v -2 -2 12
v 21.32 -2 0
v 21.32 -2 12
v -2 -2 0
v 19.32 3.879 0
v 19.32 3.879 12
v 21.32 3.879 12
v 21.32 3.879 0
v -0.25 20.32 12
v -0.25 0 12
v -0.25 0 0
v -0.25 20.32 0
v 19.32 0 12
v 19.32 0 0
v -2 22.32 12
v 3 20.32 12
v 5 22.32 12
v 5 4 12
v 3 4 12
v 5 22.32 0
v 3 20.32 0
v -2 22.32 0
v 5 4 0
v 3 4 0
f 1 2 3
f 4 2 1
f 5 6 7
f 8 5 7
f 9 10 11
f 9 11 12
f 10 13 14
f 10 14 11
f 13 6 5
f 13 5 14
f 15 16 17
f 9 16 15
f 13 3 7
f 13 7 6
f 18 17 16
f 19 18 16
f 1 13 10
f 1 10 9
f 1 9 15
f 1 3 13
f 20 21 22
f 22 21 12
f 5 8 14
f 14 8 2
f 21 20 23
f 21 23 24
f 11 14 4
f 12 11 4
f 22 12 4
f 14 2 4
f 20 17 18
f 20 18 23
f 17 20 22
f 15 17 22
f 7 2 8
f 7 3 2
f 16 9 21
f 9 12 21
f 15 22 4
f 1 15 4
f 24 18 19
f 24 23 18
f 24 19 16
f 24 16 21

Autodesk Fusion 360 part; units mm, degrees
sketch "Sketch1" plane through (0, 0, 0) normal (0, 0, 1) x (1, 0, 0)
  line L0 (0, 0) -> (0, 20.32)
  line L1 (3, 20.32) -> (3, 1.5)
  line L2 (20.32, 3) -> (3, 3)
  line L3 (3, 3) -> (3, 1.5)
  line L4 (8.5, 2) -> (8.3025, 2)
  line L5 (20.32, 3) -> (20.32, 0)
  line L6 (0, 20.32) -> (3, 20.32)
  line L7 (22.32, 0) -> (22.32, 1)
  line L8 (19.558, -2) -> (0, -2)
  line L9 (-2, 19.558) -> (-2, -2)
  line L10 (-2, -2) -> (0, -2)
  line L11 (22.32, 0) -> (22.32, -2)
  line L12 (22.32, -2) -> (19.558, -2)
  line L13 (0, 22.32) -> (-2, 22.32)
  line L14 (-2, 22.32) -> (-2, 19.558)
  line L15 (0, 22.32) -> (1, 22.32)
  line L16 (5, 19.558) -> (5, 5)
  line L17 (5, 5) -> (19.558, 5)
  line L18 (1, 22.32) -> (5, 22.32)
  line L19 (5, 22.32) -> (5, 19.558)
  line L20 (19.558, 5) -> (10.5472, 5)
  line L21 (22.32, 1) -> (22.32, 5)
  line L22 (5, 5) -> (22.32, 5)
  line L23 (0, 0) -> (20.32, 0)
  dimension "d30" = 20.32
  dimension "d31" = 20.32
  dimension "d33" = 2
  dimension "d34" = 2
  dimension "d35" = 3
  dimension "d36" = 2
  dimension "d37" = 2
  dimension "d38" = 3
sketch "Sketch2" plane through (0, 0, 0) normal (0, 0, 1) x (-1, 0, 0)
  line L0 (-8.5, 0) -> (0, 0)
  line L1 (0, 0) -> (0, -8.35)
  line L2 (0, -8.35) -> (-1, -8.35)
  line L3 (-1, -8.35) -> (-1, -1)
  line L4 (-1, -1) -> (-8.5, -1)
  line L5 (-9.5, -2) -> (-2, -2)
  line L6 (-2, -9.35) -> (1, -9.35)
  line L7 (1, -9.35) -> (1, -8.35)
  line L8 (-9.5, 0.9516) -> (-9.5, -2)
  line L9 (-3.5, -1) -> (-1, -1)
  line L10 (-1, -1) -> (-1, -4)
  line L11 (-1, -4) -> (-3.5, -4)
  line L12 (-3.5, -4) -> (-3.5, -1)
  line L13 (-3.5, -1) -> (-1, -1)
  line L14 (-1, -4) -> (-1, -1)
  line L15 (-3.5, -1) -> (-1, -1)
  line L16 (1, -8.35) -> (1, 0.9516)
  line L17 (1, 0.9516) -> (-9.5, 0.9516)
  line L18 (-1, -4) -> (-1, -8)
  line L19 (-3.5, -1) -> (-7.5, -1)
  line L20 (-1, -8) -> (-7.5024, -8)
  line L21 (-7.5024, -8) -> (-7.5, -1)
  dimension "d29" = 4
extrude "Extrude3" add sketch "Sketch1" along normal blind 8
extrude "Extrude4" cut sketch "Sketch2" along normal blind 10
sketch "Sketch3" plane through (0, 0, 8) normal (0, 0, 1) x (-1, 0, 0)
  line L0 (-3, -8) -> (-5, -8)
  line L1 (-5, -8) -> (-5, -22.32)
  line L2 (-5, -22.32) -> (2, -22.32)
  line L3 (2, -22.32) -> (2, 2)
  line L4 (2, 2) -> (-22.32, 2)
  line L5 (-22.32, 2) -> (-22.32, -5)
  line L6 (-22.32, -5) -> (-7.5014, -5)
  line L7 (-7.5014, -5) -> (-7.5007, -3)
  line L8 (-7.5007, -3) -> (-20.32, -3)
  line L9 (-20.32, -3) -> (-20.32, 0)
  line L10 (-20.32, 0) -> (0, 0)
  line L11 (0, 0) -> (0, -20.32)
  line L12 (0, -20.32) -> (-3, -20.32)
  line L13 (-3, -20.32) -> (-3, -8)
  line L14 (-5, 0) -> (-5, 0)
  line L15 (-5, 0) -> (-5, -5.022)
  line L16 (-5, -5.022) -> (-5, -5.022)
  line L17 (-5, -5.022) -> (-5, 0)
  line L18 (-22.32, 2) -> (-5, 2)
  line L19 (-5, 2) -> (-5, 2)
  line L20 (-5, 2) -> (-22.32, 2)
  line L21 (-22.32, 2) -> (-22.32, 2)
  line L22 (-5, -5.022) -> (-22.32, -5.022)
  line L23 (-22.32, -5.022) -> (-22.32, -5)
  line L24 (-22.32, -5) -> (-5, -5)
  line L25 (-5, -5) -> (-5, -5.022)
  line L26 (-5, 2) -> (-5, 0)
  line L27 (-22.32, -1.8791) -> (-5, -1.8791)
extrude "Extrude5" cut sketch "Sketch3" against normal blind 8 contours L7 L8 L9 L15 L17 L24 L27 | L5 L6 L7 L8 L9 L24 L27
extrude "Extrude6" add 1 faces at (-1.3333, 13.5467, 8) along direction (0, 0, 1) blind 4
sketch "Sketch4" plane through (0, 0, 12) normal (0, 0, 1) x (-1, 0, 0)
  line L0 (-20.32, 0) -> (0, 0)
  line L1 (-3, -20.32) -> (-3, -8)
  line L2 (-3, -8) -> (-5, -8)
  line L3 (-5, -8) -> (-5, -22.32)
  line L4 (-5, -22.32) -> (2, -22.32)
  line L5 (2, -22.32) -> (2, 2)
  line L6 (2, 2) -> (-22.32, 2)
  line L7 (0, 0) -> (0.25, 0)
  line L8 (0, -20.32) -> (0, 0)
  line L9 (0.25, 0) -> (0.25, -20.5)
  line L10 (0, -20.32) -> (0.25, -20.32)
  line L11 (-22.32, -1.8791) -> (-20.32, -1.8791)
  line L12 (-20.32, -1.8791) -> (-20.32, 0)
  line L13 (-22.32, 2) -> (-22.32, -1.8791)
  dimension "d44" = 0.25
extrude "Extrude7" cut sketch "Sketch4" against normal blind 12
extrude "Extrude8" add 1 faces at (4.3333, 8, 4) along direction (0, -1, 0) blind 4
sketch "Sketch5" plane through (0, 0, 12) normal (0, 0, 1) x (-1, 0, 0)
  line L0 (-20.32, 0) -> (0.25, 0)
  line L1 (0.25, 0) -> (0.25, -20.32)
  line L2 (0.25, -20.32) -> (-3, -20.32)
  line L3 (-3, -20.32) -> (-3, -4)
  line L4 (-3, -4) -> (-5, -4)
  line L5 (-5, -4) -> (-5, -22.32)
  line L6 (-5, -22.32) -> (2, -22.32)
  line L7 (2, -22.32) -> (2, 2)
  line L8 (2, 2) -> (-22.32, 2)
  line L9 (-22.32, 2) -> (-22.32, -1.8791)
  line L10 (-22.32, -1.8791) -> (-20.32, -1.8791)
  line L11 (-20.32, -1.8791) -> (-20.32, 0)
  line L12 (-21.32, -1.8791) -> (-20.32, -1.8791)
  line L13 (-19.32, -1.8791) -> (-19.32, 0)
  line L14 (-22.32, 0.0604) -> (-22.1613, 0)
  line L15 (-22.1613, 0) -> (-19.32, 0)
  line L16 (-22.32, -1.8791) -> (-22.32, 0.0604)
  line L17 (-21.32, -1.8791) -> (-21.32, 0)
  line L18 (-19.32, -1.8791) -> (-19.32, -3.8791)
  line L19 (-19.32, -3.8791) -> (-21.32, -3.8791)
  line L20 (-21.32, -1.8791) -> (-21.32, -3.8791)
  line L21 (-21.32, -1.8791) -> (-22.32, -1.8791)
  line L22 (-21.32, 0) -> (-21.32, 2)
  line L23 (-22.32, 2) -> (-22.32, -1.8791)
  line L24 (-21.32, -1.8791) -> (-22.32, -1.8791)
  line L25 (-21.32, 2) -> (-22.32, 2)
  dimension "d49" = 2
  dimension "d50" = 2
extrude "Extrude9" cut sketch "Sketch5" against normal blind 12 contours L9 L10 L14 L15 L16 L17 L21 L23 L24 | L8 L9 L14 L15 L22 L23 L25
extrude "Extrude10" add sketch "Sketch5" against normal blind 12 contours L0 L10 L11 L12 L13 L15 L18 L19 L20
